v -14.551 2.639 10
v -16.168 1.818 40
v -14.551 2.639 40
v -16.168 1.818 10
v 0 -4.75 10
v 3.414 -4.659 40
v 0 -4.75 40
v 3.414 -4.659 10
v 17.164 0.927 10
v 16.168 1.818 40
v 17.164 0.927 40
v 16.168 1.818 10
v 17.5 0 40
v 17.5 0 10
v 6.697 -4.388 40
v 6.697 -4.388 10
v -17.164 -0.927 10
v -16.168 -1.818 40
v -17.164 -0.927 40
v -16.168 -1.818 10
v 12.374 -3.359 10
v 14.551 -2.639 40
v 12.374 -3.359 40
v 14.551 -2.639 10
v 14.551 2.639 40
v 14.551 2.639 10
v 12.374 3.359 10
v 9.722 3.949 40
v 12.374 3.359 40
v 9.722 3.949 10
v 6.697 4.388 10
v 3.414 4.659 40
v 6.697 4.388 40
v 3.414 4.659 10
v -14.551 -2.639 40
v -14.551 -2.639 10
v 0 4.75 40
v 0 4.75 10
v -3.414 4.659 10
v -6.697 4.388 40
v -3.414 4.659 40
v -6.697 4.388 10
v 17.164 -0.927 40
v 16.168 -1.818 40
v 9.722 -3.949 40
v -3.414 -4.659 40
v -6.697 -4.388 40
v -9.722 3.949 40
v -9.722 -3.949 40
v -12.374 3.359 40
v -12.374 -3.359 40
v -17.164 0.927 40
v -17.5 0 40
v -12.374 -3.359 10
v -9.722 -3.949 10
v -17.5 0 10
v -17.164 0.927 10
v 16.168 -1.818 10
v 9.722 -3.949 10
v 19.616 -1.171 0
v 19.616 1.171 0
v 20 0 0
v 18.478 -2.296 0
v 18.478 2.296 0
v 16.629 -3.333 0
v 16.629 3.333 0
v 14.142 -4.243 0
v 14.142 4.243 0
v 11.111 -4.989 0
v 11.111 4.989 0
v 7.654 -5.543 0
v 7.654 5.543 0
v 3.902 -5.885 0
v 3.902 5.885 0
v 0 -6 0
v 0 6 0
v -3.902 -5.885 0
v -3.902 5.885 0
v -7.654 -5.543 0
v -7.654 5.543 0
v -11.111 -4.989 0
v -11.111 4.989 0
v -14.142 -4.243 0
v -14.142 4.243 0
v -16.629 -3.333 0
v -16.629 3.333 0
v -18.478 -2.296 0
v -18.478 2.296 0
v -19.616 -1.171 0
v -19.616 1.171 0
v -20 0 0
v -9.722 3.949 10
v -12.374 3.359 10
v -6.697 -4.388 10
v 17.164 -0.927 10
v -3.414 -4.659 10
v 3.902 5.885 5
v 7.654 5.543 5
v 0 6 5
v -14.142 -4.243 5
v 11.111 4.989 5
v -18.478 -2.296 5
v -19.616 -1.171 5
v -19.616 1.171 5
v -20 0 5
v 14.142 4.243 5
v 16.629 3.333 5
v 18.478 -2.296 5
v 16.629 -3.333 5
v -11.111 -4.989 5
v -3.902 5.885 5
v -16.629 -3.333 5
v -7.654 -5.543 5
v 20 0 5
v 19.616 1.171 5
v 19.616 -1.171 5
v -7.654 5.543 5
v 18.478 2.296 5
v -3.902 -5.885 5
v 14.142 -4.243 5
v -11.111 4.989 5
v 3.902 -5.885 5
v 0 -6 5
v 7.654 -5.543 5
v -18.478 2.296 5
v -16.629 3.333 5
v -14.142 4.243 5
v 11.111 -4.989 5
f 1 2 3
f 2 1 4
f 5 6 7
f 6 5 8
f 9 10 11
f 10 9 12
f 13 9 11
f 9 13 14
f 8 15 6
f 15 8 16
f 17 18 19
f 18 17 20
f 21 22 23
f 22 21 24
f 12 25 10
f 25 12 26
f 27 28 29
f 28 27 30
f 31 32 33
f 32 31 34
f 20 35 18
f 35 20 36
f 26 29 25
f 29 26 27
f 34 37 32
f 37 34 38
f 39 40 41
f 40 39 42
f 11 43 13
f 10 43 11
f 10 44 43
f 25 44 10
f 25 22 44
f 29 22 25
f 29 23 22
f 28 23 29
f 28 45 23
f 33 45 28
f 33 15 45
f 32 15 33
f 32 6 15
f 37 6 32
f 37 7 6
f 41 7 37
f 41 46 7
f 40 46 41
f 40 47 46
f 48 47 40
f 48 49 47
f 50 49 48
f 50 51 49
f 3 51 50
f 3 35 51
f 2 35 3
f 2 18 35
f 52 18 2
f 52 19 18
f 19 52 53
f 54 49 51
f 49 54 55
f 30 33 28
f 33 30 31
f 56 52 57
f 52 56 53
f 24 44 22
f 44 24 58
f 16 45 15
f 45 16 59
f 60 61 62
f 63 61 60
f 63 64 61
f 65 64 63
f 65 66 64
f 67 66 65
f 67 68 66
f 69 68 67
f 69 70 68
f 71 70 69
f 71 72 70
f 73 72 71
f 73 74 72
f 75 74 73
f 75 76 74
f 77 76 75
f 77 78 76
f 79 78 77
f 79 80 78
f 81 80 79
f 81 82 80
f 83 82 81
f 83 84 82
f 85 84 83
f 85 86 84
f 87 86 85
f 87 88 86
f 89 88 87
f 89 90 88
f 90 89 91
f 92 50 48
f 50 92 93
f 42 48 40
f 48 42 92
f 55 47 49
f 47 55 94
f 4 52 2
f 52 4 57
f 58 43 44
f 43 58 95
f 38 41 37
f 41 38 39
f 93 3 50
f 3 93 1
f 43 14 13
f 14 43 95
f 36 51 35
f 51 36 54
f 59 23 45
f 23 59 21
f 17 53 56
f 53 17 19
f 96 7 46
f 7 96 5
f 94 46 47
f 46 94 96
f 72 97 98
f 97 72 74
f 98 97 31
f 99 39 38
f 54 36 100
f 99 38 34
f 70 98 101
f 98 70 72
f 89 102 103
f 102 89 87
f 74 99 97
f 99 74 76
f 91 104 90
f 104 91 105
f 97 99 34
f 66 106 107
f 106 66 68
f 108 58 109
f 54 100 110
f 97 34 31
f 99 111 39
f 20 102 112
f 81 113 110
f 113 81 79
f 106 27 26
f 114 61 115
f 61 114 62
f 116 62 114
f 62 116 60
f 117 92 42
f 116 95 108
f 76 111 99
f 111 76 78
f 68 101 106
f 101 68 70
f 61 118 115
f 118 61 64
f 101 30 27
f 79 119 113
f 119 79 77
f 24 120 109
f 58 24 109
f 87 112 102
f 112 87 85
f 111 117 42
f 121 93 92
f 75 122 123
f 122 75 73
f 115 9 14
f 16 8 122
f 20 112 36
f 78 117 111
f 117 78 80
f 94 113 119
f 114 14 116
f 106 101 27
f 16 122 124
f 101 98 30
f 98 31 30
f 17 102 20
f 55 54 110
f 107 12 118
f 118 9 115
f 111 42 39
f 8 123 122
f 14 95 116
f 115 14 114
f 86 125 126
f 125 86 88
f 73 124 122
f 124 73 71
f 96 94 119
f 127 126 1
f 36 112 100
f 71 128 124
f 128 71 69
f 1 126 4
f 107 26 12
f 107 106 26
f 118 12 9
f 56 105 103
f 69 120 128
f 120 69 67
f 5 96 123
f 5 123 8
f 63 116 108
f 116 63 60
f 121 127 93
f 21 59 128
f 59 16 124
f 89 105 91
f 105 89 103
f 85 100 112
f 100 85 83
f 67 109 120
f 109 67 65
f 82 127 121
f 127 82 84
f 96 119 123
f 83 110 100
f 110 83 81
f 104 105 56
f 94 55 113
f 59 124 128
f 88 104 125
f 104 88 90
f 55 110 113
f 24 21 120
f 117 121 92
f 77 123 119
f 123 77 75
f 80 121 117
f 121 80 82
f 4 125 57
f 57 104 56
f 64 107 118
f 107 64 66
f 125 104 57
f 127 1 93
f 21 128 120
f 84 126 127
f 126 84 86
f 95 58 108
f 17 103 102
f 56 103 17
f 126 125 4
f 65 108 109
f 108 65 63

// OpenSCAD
$fn= 32;

module adapter( outer_d, spigot_l, slot_w, slot_h, slot_l=0, extralength = 0 )
{
    translate([0,0,-extralength/2])
        cylinder(d1=outer_d-1, d2=outer_d, h=spigot_l+0.5*extralength);
    translate([0,0,spigot_l])
    hull(){
        cylinder(d=outer_d, h=0.1, center=true);
        intersection() {
            cylinder(d1=outer_d, d2=slot_h, h=slot_w/2);
            translate([0,slot_h/2])
                cube(slot_h, center=true);
        }
        intersection(){
            scale([1,outer_d,2*(slot_w)])
            rotate([0,90,0])
                cylinder(d=1, h=0.1);
            translate([0,-outer_d,0])
                cube(outer_d);
        }
        translate([0,extralength/2,slot_w/2+extralength])
        scale([slot_h, 0.1, slot_w])
            rotate([-90,0,0])
                cylinder(d=1, h=1);
    }
    
    translate([0,0,spigot_l+extralength])
        translate([0,extralength/2, slot_w/2])
            scale([slot_h, outer_d/2 + extralength+slot_l, slot_w])
            rotate([-90,0,0])
                cylinder(d=1, h=1);
     
}
if($preview) {
    translate([0,34.75,-35])
    rotate([90,0])
     difference() {
        adapter(35.5, 30, 9.5, 35, 10 );
        adapter(33.0, 30, 7.5, 33, 10, 1);
    }

    ///*/
    translate([0,0,50])

    translate([0,-31,20])
    rotate([270,0])
    difference() {
        adapter(40, 25, 12, 38,1);
        adapter(37.5, 25, 10, 36,1, 1);
    }
}

scale([35,9.5])
cylinder(h=40, d=1);

hull() {
scale([40,12])
cylinder(h=5, d=1);
scale([35,9.5])
cylinder(h=10, d=1);

}
